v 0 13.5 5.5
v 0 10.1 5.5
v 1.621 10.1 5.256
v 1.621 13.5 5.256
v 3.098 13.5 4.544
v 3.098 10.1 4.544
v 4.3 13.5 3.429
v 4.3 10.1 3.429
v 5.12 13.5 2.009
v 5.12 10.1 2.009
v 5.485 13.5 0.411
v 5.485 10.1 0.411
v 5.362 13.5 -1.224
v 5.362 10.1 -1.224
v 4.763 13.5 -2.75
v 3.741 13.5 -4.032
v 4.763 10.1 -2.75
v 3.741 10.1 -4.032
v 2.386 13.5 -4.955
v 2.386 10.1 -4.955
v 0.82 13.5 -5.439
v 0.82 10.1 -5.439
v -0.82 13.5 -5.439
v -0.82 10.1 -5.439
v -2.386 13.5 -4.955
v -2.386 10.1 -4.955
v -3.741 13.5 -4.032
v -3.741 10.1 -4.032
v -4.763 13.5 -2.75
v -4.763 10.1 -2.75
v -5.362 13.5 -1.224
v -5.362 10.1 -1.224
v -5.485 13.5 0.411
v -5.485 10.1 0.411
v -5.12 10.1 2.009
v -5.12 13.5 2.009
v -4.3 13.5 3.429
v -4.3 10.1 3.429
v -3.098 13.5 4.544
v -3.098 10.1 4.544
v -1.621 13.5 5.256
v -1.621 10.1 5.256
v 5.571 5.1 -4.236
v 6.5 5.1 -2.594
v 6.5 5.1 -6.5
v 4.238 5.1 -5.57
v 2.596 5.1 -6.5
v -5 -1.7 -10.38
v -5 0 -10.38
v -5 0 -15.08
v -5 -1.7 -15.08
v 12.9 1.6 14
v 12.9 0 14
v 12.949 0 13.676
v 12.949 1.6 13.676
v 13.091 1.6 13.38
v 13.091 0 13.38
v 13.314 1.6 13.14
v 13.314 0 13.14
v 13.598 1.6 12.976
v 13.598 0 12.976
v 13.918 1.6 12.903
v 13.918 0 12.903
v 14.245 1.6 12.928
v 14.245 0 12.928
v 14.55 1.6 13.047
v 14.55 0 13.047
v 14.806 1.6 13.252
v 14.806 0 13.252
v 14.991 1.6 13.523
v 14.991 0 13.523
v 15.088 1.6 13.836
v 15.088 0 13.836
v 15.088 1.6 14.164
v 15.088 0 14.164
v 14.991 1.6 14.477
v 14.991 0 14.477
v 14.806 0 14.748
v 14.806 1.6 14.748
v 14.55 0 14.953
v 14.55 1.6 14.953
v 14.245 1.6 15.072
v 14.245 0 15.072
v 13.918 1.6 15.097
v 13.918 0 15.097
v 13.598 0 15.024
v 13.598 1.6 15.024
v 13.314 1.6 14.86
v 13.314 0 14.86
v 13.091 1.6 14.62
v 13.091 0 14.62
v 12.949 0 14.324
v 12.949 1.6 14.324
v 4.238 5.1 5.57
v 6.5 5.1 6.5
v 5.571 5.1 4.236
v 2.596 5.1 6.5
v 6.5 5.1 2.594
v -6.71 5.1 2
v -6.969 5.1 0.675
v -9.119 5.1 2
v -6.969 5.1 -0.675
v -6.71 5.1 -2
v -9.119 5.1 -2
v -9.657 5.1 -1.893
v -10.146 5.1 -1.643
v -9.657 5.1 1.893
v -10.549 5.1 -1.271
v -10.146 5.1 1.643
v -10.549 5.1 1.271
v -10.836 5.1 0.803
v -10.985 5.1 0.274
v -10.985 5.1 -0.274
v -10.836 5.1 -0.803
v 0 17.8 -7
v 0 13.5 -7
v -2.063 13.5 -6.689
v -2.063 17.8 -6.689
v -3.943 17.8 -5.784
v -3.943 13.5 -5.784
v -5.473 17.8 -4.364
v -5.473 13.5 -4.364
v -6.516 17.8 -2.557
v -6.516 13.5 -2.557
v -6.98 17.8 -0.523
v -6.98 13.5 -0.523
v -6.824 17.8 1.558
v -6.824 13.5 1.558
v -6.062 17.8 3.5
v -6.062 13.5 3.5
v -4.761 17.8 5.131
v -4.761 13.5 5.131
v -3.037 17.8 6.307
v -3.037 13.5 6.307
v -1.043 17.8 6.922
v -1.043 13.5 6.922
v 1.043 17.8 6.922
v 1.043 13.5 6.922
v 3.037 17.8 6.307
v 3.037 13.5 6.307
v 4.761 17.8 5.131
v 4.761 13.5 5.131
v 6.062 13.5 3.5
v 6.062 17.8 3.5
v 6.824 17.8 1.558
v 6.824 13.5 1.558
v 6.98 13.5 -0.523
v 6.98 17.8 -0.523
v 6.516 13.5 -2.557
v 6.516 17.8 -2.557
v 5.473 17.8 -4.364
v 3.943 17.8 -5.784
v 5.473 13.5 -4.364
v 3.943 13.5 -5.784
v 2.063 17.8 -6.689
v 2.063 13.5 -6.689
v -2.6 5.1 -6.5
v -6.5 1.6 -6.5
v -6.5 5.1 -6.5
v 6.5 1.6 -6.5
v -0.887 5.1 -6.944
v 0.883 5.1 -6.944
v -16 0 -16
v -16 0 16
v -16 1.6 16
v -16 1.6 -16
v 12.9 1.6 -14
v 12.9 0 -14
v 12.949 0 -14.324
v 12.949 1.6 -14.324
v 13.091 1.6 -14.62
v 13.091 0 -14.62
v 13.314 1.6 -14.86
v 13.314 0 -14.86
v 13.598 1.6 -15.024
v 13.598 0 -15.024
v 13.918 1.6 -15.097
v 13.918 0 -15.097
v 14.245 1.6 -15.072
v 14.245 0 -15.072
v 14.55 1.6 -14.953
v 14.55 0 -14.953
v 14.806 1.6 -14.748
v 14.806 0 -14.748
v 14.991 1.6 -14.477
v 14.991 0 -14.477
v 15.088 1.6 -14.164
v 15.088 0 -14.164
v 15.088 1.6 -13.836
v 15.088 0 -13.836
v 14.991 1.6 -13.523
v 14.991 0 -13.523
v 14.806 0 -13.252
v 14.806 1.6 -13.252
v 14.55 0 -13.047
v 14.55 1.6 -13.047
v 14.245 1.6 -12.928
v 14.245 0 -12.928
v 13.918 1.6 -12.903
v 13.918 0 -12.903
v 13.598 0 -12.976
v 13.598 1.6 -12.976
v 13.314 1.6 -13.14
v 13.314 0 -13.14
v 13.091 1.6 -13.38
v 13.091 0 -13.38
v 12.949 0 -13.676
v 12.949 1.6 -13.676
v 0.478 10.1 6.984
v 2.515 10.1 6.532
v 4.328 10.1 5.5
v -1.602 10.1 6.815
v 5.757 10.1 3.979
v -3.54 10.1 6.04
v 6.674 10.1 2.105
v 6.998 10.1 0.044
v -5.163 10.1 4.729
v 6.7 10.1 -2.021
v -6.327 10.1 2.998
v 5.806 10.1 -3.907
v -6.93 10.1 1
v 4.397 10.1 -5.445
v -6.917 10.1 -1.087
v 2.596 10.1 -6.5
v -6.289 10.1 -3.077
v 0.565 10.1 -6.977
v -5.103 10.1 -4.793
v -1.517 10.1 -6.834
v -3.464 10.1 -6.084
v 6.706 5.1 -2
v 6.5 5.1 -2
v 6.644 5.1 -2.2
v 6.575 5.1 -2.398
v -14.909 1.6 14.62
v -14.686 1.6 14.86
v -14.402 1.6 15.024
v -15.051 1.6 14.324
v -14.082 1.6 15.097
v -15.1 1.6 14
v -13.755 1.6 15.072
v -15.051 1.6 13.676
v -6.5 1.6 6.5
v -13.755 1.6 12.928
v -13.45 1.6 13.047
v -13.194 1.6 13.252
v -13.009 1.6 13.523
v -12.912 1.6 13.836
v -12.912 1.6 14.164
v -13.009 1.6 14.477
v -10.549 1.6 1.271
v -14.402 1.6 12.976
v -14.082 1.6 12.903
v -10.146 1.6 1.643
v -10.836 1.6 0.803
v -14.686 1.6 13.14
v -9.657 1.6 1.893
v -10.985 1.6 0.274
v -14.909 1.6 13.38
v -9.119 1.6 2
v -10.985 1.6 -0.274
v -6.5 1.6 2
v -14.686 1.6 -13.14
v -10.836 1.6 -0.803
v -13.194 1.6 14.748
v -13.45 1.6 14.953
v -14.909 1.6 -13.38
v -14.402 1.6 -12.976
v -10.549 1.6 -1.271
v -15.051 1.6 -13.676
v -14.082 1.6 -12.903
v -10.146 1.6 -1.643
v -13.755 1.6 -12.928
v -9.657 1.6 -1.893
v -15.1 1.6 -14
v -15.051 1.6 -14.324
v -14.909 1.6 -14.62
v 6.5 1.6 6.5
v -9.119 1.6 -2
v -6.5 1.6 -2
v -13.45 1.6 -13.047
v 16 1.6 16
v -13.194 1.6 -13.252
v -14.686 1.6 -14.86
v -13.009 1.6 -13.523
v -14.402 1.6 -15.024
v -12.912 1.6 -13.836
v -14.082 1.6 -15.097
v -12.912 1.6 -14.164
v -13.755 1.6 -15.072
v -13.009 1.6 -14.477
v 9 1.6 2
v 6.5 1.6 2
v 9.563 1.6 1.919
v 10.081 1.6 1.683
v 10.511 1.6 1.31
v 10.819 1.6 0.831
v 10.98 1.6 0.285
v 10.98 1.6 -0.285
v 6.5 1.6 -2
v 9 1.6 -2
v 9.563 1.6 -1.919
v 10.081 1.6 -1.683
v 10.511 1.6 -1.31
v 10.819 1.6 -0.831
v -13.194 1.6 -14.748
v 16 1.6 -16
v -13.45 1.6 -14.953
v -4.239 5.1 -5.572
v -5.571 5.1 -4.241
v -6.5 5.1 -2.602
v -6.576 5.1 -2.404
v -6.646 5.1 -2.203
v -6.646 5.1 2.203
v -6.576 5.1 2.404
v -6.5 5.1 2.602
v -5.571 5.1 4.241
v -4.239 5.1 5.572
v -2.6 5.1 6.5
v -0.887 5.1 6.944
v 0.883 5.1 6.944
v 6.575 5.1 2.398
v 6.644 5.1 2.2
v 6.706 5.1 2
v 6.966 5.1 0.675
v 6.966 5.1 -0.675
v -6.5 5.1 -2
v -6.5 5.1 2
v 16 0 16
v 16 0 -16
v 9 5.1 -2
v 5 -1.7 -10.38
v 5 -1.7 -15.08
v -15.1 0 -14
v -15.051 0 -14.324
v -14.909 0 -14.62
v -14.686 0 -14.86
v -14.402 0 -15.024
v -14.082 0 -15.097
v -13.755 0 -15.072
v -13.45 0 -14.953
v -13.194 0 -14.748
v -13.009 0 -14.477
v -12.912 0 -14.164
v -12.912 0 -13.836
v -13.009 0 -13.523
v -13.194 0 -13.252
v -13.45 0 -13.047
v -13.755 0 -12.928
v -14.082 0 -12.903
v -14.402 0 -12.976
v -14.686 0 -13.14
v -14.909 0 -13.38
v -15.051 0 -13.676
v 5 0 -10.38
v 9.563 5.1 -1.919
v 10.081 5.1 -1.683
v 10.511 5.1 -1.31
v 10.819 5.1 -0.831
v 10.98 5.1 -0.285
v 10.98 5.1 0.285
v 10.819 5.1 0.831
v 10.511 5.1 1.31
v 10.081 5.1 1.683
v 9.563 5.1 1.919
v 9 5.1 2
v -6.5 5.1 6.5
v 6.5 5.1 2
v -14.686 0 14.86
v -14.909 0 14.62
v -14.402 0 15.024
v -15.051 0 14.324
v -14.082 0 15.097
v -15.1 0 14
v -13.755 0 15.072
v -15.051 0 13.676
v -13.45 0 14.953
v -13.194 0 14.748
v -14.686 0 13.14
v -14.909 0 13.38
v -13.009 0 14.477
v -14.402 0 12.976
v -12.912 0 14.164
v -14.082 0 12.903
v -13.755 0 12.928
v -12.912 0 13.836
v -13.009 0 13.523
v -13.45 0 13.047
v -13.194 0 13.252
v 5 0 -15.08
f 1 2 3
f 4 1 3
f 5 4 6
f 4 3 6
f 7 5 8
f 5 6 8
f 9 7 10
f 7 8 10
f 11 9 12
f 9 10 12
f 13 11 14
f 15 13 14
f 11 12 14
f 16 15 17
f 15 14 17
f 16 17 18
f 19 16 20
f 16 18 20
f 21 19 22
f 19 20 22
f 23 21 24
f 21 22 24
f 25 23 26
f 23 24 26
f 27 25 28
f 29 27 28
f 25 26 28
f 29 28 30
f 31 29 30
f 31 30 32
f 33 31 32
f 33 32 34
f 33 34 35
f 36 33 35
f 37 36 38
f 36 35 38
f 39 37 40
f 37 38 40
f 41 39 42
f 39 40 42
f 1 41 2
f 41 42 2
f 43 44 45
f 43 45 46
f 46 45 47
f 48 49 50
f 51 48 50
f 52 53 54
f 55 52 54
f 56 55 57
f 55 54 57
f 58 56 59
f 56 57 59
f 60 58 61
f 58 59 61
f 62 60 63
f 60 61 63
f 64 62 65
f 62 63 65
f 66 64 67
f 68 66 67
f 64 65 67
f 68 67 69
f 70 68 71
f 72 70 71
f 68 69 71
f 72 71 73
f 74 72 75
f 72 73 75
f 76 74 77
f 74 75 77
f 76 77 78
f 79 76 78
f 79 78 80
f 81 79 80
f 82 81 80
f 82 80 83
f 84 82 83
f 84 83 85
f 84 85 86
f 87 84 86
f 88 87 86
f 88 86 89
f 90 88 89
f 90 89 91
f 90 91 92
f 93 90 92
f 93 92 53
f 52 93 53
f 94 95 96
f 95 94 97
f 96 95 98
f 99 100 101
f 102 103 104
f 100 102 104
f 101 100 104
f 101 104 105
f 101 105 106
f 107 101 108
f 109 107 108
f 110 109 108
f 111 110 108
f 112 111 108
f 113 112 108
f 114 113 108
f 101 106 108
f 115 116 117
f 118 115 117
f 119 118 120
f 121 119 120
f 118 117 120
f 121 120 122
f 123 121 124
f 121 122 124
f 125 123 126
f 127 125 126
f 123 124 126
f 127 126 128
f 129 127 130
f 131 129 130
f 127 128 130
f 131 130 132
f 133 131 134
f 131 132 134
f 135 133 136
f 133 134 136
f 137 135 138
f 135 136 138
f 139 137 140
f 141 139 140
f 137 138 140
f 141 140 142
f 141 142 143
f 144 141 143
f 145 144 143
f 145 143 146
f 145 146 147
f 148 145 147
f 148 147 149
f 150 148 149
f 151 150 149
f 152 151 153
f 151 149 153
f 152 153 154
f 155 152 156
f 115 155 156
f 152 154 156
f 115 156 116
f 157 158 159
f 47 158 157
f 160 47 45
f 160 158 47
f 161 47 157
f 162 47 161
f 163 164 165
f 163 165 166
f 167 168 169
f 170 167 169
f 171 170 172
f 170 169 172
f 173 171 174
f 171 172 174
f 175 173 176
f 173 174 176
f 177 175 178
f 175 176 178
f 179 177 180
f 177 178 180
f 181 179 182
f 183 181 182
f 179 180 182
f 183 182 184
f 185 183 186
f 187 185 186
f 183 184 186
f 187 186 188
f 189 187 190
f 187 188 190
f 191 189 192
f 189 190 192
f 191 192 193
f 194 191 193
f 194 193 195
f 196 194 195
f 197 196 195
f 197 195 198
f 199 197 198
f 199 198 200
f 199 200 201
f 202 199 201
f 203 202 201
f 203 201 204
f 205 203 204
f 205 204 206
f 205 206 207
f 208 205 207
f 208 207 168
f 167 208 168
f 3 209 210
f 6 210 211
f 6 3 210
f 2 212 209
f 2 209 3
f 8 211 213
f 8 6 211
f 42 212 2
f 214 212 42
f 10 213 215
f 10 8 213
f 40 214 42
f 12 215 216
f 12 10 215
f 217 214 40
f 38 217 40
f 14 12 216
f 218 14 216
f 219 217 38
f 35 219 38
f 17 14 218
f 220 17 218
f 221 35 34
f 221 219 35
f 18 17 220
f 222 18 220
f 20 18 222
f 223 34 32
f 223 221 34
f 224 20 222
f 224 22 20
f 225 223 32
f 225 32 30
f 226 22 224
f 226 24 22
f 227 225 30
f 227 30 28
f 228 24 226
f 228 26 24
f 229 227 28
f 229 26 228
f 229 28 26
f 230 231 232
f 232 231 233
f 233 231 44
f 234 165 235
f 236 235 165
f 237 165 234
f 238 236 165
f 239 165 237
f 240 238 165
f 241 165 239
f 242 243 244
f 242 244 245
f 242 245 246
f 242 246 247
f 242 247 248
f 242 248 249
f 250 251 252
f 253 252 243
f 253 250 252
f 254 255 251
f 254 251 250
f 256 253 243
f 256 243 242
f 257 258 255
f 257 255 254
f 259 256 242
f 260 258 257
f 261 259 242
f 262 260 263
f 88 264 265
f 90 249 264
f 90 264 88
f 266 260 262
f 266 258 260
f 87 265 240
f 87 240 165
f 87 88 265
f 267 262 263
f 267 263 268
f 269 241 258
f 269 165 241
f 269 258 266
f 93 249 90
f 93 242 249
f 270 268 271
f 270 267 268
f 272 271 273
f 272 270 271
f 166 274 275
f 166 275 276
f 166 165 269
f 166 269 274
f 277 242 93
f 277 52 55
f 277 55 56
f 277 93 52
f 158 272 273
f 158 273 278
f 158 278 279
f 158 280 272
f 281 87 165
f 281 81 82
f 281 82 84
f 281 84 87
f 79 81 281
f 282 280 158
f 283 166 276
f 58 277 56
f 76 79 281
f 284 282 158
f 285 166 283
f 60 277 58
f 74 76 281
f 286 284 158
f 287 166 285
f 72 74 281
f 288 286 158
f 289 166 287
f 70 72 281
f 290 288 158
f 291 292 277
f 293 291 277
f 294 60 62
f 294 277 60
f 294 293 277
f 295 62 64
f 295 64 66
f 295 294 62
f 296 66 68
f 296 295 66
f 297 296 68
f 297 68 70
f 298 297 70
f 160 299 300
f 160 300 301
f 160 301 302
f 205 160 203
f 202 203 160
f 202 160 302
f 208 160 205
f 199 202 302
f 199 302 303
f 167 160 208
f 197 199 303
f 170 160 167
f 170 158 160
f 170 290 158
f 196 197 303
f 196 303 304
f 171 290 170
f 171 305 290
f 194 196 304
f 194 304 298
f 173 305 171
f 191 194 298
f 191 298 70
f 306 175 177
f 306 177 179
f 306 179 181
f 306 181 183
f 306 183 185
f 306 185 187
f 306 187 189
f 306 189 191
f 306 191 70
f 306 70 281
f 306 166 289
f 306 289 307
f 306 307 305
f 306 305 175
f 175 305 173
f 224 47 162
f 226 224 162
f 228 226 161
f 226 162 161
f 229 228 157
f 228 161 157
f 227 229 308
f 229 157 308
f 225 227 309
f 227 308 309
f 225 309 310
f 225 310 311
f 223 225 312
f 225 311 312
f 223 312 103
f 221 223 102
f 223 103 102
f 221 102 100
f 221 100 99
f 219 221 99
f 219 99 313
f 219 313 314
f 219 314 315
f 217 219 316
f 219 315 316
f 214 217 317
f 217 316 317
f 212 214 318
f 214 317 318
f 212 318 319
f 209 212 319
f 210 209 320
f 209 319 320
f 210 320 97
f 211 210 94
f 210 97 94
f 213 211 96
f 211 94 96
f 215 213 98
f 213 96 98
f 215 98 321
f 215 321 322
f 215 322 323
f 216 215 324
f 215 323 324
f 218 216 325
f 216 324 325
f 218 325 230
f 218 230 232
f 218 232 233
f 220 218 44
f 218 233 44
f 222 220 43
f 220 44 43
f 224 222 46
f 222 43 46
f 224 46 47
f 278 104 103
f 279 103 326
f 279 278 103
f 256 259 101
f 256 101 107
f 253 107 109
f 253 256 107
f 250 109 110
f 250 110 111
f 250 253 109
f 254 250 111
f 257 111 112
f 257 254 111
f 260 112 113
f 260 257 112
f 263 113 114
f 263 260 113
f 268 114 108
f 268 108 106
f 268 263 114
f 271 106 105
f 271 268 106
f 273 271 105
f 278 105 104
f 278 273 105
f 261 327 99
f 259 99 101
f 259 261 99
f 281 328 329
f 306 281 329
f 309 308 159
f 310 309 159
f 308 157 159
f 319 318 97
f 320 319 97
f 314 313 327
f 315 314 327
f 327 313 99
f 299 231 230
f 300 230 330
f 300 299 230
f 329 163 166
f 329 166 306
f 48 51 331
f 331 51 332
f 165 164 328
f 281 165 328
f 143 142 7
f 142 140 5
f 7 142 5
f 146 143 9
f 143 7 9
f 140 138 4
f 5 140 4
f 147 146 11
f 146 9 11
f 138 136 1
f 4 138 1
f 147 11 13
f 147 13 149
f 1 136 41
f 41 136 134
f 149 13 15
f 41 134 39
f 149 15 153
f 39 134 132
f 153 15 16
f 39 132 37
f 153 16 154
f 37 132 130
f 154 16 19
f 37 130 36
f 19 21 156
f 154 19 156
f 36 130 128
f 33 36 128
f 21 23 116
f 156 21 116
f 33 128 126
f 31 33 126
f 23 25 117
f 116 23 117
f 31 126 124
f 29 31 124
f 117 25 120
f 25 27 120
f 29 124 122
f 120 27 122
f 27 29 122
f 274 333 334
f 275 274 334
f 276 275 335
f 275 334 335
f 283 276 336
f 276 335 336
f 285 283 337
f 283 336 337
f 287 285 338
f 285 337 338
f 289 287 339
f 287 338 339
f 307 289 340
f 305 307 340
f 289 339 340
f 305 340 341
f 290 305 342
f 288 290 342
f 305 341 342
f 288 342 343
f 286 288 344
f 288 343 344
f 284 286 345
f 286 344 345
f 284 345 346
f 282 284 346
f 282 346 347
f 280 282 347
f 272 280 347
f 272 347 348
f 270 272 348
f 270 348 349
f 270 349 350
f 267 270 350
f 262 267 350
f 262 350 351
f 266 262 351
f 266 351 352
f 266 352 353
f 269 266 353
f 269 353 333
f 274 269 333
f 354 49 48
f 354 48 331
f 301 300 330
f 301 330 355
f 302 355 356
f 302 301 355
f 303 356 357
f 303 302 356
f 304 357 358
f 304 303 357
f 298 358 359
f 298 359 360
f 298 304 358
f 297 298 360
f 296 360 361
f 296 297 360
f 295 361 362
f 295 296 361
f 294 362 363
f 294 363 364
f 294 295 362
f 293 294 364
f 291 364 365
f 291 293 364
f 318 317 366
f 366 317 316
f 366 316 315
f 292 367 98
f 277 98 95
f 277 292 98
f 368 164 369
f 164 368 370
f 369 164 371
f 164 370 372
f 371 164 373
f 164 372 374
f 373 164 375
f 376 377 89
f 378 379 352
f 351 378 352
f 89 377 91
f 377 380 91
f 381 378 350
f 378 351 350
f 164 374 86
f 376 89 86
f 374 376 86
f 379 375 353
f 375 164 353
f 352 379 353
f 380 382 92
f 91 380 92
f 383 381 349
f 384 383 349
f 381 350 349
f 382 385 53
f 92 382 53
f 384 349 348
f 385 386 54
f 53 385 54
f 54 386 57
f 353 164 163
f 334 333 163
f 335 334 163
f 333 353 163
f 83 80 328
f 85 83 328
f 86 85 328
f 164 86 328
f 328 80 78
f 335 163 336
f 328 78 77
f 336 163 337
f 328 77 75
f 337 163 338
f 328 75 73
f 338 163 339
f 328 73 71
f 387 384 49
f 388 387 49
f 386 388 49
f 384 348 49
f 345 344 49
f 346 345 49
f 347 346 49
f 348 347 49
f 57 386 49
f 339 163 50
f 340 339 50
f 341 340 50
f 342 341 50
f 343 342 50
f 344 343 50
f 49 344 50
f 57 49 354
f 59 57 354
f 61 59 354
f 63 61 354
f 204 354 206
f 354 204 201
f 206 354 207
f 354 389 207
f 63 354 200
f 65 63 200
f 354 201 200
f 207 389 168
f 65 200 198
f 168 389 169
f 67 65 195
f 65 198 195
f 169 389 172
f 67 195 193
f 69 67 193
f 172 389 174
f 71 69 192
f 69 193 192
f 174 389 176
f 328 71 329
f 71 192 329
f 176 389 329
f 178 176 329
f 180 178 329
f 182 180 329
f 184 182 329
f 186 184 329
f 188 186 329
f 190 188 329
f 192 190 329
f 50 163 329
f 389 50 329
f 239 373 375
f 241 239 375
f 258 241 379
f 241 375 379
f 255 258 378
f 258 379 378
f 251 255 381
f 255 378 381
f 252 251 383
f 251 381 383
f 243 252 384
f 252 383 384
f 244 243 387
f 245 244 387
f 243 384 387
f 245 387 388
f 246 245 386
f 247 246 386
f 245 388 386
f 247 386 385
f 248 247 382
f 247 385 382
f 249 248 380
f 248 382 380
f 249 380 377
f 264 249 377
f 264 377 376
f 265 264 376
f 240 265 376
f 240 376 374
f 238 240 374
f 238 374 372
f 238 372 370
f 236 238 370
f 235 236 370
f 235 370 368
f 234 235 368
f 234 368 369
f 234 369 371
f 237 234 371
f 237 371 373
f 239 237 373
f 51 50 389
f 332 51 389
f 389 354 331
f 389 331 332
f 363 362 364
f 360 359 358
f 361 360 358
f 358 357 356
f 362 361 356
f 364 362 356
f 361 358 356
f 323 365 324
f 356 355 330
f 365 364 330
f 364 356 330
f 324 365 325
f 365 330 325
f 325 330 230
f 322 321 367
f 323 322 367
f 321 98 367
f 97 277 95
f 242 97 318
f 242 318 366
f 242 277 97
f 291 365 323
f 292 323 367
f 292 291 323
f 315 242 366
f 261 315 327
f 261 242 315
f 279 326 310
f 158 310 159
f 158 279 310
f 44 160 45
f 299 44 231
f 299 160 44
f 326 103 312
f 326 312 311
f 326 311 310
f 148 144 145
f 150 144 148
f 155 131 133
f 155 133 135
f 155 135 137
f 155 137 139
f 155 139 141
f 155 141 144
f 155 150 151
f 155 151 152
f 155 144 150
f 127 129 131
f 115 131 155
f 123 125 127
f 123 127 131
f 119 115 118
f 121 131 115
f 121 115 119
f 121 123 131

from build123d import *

# Parameters (mm, degrees)
SKETCH_1_W         = 32
SKETCH_1_H         = 32
EXTRUDE_1_DEPTH    = 1.6
HOLE_WIZARD_M2_1_D = 2.2
SKETCH_4_W         = 10
SKETCH_4_H         = 4.7
EXTRUDE_2_DEPTH    = 1.7
EXTRUDE_4_DEPTH    = 3.5
SKETCH_7_R         = 7
EXTRUDE_5_DEPTH    = 5
SKETCH_8_R         = 5.5
EXTRUDE_6_DEPTH    = 3.4
SKETCH_9_R         = 7
EXTRUDE_7_DEPTH    = 4.3


with BuildPart() as part:
    # 草图1 → 凸台-拉伸1 (new body)
    with BuildSketch(Plane(origin=(0, 0, 0), x_dir=(1, 0, 0), z_dir=(0, 1, 0))):
        Rectangle(SKETCH_1_W, SKETCH_1_H)
    extrude(amount=EXTRUDE_1_DEPTH)

    # M2 间隙孔1 (through all)
    with Locations(Plane(origin=(0, 1.6, 0), x_dir=(1, 0, 0), z_dir=(0, 1, 0))):
        with Locations((-14, 14), (14, 14), (14, -14), (-14, -14)):
            Hole(HOLE_WIZARD_M2_1_D / 2)

    # 草图4 → 凸台-拉伸2 (add)
    with BuildSketch(Plane(origin=(0, 0, 0), x_dir=(1, 0, 0), z_dir=(0, 1, 0))):
        with Locations((0, 12.73)):
            Rectangle(SKETCH_4_W, SKETCH_4_H)
    extrude(amount=-EXTRUDE_2_DEPTH)

    # 草图6 → 凸台-拉伸4 (add)
    with BuildSketch(Plane(origin=(0, 1.6, 0), x_dir=(1, 0, 0), z_dir=(0, 1, 0))):
        with BuildLine():
            Line((-6.5, 6.5), (6.5, 6.5))
            Line((6.5, 6.5), (6.5, 2))
            Line((6.5, 2), (9, 2))
            ThreePointArc((9, 2), (11, 0), (9, -2))
            Line((9, -2), (6.5, -2))
            Line((6.5, -2), (6.5, -6.5))
            Line((6.5, -6.5), (-6.5, -6.5))
            Line((-6.5, -6.5), (-6.5, -2))
            Line((-6.5, -2), (-9.119024186, -2))
            ThreePointArc((-9.119024186, -2), (-11.003538559, 0), (-9.119024186, 2))
            Line((-9.119024186, 2), (-6.5, 2))
            Line((-6.5, 2), (-6.5, 6.5))
        make_face()
    extrude(amount=EXTRUDE_4_DEPTH)

    # 草图7 → 凸台-拉伸5 (add)
    with BuildSketch(Plane(origin=(0, 5.1, 0), x_dir=(1, 0, 0), z_dir=(0, 1, 0))):
        with Locations(Location((-0.001769279, 0, 0), (0, 0, 68.213210702))):
            Circle(SKETCH_7_R)
    extrude(amount=EXTRUDE_5_DEPTH)

    # 草图8 → 凸台-拉伸6 (add)
    with BuildSketch(Plane(origin=(0, 10.1, 0), x_dir=(1, 0, 0), z_dir=(0, 1, 0))):
        with Locations(Location((0, 0, 0), (0, 0, 270))):
            Circle(SKETCH_8_R)
    extrude(amount=EXTRUDE_6_DEPTH)

    # 草图9 → 凸台-拉伸7 (add)
    with BuildSketch(Plane(origin=(0, 13.5, 0), x_dir=(1, 0, 0), z_dir=(0, 1, 0))):
        with Locations(Location((0, 0, 0), (0, 0, 90))):
            Circle(SKETCH_9_R)
    extrude(amount=EXTRUDE_7_DEPTH)


solid = part.part
